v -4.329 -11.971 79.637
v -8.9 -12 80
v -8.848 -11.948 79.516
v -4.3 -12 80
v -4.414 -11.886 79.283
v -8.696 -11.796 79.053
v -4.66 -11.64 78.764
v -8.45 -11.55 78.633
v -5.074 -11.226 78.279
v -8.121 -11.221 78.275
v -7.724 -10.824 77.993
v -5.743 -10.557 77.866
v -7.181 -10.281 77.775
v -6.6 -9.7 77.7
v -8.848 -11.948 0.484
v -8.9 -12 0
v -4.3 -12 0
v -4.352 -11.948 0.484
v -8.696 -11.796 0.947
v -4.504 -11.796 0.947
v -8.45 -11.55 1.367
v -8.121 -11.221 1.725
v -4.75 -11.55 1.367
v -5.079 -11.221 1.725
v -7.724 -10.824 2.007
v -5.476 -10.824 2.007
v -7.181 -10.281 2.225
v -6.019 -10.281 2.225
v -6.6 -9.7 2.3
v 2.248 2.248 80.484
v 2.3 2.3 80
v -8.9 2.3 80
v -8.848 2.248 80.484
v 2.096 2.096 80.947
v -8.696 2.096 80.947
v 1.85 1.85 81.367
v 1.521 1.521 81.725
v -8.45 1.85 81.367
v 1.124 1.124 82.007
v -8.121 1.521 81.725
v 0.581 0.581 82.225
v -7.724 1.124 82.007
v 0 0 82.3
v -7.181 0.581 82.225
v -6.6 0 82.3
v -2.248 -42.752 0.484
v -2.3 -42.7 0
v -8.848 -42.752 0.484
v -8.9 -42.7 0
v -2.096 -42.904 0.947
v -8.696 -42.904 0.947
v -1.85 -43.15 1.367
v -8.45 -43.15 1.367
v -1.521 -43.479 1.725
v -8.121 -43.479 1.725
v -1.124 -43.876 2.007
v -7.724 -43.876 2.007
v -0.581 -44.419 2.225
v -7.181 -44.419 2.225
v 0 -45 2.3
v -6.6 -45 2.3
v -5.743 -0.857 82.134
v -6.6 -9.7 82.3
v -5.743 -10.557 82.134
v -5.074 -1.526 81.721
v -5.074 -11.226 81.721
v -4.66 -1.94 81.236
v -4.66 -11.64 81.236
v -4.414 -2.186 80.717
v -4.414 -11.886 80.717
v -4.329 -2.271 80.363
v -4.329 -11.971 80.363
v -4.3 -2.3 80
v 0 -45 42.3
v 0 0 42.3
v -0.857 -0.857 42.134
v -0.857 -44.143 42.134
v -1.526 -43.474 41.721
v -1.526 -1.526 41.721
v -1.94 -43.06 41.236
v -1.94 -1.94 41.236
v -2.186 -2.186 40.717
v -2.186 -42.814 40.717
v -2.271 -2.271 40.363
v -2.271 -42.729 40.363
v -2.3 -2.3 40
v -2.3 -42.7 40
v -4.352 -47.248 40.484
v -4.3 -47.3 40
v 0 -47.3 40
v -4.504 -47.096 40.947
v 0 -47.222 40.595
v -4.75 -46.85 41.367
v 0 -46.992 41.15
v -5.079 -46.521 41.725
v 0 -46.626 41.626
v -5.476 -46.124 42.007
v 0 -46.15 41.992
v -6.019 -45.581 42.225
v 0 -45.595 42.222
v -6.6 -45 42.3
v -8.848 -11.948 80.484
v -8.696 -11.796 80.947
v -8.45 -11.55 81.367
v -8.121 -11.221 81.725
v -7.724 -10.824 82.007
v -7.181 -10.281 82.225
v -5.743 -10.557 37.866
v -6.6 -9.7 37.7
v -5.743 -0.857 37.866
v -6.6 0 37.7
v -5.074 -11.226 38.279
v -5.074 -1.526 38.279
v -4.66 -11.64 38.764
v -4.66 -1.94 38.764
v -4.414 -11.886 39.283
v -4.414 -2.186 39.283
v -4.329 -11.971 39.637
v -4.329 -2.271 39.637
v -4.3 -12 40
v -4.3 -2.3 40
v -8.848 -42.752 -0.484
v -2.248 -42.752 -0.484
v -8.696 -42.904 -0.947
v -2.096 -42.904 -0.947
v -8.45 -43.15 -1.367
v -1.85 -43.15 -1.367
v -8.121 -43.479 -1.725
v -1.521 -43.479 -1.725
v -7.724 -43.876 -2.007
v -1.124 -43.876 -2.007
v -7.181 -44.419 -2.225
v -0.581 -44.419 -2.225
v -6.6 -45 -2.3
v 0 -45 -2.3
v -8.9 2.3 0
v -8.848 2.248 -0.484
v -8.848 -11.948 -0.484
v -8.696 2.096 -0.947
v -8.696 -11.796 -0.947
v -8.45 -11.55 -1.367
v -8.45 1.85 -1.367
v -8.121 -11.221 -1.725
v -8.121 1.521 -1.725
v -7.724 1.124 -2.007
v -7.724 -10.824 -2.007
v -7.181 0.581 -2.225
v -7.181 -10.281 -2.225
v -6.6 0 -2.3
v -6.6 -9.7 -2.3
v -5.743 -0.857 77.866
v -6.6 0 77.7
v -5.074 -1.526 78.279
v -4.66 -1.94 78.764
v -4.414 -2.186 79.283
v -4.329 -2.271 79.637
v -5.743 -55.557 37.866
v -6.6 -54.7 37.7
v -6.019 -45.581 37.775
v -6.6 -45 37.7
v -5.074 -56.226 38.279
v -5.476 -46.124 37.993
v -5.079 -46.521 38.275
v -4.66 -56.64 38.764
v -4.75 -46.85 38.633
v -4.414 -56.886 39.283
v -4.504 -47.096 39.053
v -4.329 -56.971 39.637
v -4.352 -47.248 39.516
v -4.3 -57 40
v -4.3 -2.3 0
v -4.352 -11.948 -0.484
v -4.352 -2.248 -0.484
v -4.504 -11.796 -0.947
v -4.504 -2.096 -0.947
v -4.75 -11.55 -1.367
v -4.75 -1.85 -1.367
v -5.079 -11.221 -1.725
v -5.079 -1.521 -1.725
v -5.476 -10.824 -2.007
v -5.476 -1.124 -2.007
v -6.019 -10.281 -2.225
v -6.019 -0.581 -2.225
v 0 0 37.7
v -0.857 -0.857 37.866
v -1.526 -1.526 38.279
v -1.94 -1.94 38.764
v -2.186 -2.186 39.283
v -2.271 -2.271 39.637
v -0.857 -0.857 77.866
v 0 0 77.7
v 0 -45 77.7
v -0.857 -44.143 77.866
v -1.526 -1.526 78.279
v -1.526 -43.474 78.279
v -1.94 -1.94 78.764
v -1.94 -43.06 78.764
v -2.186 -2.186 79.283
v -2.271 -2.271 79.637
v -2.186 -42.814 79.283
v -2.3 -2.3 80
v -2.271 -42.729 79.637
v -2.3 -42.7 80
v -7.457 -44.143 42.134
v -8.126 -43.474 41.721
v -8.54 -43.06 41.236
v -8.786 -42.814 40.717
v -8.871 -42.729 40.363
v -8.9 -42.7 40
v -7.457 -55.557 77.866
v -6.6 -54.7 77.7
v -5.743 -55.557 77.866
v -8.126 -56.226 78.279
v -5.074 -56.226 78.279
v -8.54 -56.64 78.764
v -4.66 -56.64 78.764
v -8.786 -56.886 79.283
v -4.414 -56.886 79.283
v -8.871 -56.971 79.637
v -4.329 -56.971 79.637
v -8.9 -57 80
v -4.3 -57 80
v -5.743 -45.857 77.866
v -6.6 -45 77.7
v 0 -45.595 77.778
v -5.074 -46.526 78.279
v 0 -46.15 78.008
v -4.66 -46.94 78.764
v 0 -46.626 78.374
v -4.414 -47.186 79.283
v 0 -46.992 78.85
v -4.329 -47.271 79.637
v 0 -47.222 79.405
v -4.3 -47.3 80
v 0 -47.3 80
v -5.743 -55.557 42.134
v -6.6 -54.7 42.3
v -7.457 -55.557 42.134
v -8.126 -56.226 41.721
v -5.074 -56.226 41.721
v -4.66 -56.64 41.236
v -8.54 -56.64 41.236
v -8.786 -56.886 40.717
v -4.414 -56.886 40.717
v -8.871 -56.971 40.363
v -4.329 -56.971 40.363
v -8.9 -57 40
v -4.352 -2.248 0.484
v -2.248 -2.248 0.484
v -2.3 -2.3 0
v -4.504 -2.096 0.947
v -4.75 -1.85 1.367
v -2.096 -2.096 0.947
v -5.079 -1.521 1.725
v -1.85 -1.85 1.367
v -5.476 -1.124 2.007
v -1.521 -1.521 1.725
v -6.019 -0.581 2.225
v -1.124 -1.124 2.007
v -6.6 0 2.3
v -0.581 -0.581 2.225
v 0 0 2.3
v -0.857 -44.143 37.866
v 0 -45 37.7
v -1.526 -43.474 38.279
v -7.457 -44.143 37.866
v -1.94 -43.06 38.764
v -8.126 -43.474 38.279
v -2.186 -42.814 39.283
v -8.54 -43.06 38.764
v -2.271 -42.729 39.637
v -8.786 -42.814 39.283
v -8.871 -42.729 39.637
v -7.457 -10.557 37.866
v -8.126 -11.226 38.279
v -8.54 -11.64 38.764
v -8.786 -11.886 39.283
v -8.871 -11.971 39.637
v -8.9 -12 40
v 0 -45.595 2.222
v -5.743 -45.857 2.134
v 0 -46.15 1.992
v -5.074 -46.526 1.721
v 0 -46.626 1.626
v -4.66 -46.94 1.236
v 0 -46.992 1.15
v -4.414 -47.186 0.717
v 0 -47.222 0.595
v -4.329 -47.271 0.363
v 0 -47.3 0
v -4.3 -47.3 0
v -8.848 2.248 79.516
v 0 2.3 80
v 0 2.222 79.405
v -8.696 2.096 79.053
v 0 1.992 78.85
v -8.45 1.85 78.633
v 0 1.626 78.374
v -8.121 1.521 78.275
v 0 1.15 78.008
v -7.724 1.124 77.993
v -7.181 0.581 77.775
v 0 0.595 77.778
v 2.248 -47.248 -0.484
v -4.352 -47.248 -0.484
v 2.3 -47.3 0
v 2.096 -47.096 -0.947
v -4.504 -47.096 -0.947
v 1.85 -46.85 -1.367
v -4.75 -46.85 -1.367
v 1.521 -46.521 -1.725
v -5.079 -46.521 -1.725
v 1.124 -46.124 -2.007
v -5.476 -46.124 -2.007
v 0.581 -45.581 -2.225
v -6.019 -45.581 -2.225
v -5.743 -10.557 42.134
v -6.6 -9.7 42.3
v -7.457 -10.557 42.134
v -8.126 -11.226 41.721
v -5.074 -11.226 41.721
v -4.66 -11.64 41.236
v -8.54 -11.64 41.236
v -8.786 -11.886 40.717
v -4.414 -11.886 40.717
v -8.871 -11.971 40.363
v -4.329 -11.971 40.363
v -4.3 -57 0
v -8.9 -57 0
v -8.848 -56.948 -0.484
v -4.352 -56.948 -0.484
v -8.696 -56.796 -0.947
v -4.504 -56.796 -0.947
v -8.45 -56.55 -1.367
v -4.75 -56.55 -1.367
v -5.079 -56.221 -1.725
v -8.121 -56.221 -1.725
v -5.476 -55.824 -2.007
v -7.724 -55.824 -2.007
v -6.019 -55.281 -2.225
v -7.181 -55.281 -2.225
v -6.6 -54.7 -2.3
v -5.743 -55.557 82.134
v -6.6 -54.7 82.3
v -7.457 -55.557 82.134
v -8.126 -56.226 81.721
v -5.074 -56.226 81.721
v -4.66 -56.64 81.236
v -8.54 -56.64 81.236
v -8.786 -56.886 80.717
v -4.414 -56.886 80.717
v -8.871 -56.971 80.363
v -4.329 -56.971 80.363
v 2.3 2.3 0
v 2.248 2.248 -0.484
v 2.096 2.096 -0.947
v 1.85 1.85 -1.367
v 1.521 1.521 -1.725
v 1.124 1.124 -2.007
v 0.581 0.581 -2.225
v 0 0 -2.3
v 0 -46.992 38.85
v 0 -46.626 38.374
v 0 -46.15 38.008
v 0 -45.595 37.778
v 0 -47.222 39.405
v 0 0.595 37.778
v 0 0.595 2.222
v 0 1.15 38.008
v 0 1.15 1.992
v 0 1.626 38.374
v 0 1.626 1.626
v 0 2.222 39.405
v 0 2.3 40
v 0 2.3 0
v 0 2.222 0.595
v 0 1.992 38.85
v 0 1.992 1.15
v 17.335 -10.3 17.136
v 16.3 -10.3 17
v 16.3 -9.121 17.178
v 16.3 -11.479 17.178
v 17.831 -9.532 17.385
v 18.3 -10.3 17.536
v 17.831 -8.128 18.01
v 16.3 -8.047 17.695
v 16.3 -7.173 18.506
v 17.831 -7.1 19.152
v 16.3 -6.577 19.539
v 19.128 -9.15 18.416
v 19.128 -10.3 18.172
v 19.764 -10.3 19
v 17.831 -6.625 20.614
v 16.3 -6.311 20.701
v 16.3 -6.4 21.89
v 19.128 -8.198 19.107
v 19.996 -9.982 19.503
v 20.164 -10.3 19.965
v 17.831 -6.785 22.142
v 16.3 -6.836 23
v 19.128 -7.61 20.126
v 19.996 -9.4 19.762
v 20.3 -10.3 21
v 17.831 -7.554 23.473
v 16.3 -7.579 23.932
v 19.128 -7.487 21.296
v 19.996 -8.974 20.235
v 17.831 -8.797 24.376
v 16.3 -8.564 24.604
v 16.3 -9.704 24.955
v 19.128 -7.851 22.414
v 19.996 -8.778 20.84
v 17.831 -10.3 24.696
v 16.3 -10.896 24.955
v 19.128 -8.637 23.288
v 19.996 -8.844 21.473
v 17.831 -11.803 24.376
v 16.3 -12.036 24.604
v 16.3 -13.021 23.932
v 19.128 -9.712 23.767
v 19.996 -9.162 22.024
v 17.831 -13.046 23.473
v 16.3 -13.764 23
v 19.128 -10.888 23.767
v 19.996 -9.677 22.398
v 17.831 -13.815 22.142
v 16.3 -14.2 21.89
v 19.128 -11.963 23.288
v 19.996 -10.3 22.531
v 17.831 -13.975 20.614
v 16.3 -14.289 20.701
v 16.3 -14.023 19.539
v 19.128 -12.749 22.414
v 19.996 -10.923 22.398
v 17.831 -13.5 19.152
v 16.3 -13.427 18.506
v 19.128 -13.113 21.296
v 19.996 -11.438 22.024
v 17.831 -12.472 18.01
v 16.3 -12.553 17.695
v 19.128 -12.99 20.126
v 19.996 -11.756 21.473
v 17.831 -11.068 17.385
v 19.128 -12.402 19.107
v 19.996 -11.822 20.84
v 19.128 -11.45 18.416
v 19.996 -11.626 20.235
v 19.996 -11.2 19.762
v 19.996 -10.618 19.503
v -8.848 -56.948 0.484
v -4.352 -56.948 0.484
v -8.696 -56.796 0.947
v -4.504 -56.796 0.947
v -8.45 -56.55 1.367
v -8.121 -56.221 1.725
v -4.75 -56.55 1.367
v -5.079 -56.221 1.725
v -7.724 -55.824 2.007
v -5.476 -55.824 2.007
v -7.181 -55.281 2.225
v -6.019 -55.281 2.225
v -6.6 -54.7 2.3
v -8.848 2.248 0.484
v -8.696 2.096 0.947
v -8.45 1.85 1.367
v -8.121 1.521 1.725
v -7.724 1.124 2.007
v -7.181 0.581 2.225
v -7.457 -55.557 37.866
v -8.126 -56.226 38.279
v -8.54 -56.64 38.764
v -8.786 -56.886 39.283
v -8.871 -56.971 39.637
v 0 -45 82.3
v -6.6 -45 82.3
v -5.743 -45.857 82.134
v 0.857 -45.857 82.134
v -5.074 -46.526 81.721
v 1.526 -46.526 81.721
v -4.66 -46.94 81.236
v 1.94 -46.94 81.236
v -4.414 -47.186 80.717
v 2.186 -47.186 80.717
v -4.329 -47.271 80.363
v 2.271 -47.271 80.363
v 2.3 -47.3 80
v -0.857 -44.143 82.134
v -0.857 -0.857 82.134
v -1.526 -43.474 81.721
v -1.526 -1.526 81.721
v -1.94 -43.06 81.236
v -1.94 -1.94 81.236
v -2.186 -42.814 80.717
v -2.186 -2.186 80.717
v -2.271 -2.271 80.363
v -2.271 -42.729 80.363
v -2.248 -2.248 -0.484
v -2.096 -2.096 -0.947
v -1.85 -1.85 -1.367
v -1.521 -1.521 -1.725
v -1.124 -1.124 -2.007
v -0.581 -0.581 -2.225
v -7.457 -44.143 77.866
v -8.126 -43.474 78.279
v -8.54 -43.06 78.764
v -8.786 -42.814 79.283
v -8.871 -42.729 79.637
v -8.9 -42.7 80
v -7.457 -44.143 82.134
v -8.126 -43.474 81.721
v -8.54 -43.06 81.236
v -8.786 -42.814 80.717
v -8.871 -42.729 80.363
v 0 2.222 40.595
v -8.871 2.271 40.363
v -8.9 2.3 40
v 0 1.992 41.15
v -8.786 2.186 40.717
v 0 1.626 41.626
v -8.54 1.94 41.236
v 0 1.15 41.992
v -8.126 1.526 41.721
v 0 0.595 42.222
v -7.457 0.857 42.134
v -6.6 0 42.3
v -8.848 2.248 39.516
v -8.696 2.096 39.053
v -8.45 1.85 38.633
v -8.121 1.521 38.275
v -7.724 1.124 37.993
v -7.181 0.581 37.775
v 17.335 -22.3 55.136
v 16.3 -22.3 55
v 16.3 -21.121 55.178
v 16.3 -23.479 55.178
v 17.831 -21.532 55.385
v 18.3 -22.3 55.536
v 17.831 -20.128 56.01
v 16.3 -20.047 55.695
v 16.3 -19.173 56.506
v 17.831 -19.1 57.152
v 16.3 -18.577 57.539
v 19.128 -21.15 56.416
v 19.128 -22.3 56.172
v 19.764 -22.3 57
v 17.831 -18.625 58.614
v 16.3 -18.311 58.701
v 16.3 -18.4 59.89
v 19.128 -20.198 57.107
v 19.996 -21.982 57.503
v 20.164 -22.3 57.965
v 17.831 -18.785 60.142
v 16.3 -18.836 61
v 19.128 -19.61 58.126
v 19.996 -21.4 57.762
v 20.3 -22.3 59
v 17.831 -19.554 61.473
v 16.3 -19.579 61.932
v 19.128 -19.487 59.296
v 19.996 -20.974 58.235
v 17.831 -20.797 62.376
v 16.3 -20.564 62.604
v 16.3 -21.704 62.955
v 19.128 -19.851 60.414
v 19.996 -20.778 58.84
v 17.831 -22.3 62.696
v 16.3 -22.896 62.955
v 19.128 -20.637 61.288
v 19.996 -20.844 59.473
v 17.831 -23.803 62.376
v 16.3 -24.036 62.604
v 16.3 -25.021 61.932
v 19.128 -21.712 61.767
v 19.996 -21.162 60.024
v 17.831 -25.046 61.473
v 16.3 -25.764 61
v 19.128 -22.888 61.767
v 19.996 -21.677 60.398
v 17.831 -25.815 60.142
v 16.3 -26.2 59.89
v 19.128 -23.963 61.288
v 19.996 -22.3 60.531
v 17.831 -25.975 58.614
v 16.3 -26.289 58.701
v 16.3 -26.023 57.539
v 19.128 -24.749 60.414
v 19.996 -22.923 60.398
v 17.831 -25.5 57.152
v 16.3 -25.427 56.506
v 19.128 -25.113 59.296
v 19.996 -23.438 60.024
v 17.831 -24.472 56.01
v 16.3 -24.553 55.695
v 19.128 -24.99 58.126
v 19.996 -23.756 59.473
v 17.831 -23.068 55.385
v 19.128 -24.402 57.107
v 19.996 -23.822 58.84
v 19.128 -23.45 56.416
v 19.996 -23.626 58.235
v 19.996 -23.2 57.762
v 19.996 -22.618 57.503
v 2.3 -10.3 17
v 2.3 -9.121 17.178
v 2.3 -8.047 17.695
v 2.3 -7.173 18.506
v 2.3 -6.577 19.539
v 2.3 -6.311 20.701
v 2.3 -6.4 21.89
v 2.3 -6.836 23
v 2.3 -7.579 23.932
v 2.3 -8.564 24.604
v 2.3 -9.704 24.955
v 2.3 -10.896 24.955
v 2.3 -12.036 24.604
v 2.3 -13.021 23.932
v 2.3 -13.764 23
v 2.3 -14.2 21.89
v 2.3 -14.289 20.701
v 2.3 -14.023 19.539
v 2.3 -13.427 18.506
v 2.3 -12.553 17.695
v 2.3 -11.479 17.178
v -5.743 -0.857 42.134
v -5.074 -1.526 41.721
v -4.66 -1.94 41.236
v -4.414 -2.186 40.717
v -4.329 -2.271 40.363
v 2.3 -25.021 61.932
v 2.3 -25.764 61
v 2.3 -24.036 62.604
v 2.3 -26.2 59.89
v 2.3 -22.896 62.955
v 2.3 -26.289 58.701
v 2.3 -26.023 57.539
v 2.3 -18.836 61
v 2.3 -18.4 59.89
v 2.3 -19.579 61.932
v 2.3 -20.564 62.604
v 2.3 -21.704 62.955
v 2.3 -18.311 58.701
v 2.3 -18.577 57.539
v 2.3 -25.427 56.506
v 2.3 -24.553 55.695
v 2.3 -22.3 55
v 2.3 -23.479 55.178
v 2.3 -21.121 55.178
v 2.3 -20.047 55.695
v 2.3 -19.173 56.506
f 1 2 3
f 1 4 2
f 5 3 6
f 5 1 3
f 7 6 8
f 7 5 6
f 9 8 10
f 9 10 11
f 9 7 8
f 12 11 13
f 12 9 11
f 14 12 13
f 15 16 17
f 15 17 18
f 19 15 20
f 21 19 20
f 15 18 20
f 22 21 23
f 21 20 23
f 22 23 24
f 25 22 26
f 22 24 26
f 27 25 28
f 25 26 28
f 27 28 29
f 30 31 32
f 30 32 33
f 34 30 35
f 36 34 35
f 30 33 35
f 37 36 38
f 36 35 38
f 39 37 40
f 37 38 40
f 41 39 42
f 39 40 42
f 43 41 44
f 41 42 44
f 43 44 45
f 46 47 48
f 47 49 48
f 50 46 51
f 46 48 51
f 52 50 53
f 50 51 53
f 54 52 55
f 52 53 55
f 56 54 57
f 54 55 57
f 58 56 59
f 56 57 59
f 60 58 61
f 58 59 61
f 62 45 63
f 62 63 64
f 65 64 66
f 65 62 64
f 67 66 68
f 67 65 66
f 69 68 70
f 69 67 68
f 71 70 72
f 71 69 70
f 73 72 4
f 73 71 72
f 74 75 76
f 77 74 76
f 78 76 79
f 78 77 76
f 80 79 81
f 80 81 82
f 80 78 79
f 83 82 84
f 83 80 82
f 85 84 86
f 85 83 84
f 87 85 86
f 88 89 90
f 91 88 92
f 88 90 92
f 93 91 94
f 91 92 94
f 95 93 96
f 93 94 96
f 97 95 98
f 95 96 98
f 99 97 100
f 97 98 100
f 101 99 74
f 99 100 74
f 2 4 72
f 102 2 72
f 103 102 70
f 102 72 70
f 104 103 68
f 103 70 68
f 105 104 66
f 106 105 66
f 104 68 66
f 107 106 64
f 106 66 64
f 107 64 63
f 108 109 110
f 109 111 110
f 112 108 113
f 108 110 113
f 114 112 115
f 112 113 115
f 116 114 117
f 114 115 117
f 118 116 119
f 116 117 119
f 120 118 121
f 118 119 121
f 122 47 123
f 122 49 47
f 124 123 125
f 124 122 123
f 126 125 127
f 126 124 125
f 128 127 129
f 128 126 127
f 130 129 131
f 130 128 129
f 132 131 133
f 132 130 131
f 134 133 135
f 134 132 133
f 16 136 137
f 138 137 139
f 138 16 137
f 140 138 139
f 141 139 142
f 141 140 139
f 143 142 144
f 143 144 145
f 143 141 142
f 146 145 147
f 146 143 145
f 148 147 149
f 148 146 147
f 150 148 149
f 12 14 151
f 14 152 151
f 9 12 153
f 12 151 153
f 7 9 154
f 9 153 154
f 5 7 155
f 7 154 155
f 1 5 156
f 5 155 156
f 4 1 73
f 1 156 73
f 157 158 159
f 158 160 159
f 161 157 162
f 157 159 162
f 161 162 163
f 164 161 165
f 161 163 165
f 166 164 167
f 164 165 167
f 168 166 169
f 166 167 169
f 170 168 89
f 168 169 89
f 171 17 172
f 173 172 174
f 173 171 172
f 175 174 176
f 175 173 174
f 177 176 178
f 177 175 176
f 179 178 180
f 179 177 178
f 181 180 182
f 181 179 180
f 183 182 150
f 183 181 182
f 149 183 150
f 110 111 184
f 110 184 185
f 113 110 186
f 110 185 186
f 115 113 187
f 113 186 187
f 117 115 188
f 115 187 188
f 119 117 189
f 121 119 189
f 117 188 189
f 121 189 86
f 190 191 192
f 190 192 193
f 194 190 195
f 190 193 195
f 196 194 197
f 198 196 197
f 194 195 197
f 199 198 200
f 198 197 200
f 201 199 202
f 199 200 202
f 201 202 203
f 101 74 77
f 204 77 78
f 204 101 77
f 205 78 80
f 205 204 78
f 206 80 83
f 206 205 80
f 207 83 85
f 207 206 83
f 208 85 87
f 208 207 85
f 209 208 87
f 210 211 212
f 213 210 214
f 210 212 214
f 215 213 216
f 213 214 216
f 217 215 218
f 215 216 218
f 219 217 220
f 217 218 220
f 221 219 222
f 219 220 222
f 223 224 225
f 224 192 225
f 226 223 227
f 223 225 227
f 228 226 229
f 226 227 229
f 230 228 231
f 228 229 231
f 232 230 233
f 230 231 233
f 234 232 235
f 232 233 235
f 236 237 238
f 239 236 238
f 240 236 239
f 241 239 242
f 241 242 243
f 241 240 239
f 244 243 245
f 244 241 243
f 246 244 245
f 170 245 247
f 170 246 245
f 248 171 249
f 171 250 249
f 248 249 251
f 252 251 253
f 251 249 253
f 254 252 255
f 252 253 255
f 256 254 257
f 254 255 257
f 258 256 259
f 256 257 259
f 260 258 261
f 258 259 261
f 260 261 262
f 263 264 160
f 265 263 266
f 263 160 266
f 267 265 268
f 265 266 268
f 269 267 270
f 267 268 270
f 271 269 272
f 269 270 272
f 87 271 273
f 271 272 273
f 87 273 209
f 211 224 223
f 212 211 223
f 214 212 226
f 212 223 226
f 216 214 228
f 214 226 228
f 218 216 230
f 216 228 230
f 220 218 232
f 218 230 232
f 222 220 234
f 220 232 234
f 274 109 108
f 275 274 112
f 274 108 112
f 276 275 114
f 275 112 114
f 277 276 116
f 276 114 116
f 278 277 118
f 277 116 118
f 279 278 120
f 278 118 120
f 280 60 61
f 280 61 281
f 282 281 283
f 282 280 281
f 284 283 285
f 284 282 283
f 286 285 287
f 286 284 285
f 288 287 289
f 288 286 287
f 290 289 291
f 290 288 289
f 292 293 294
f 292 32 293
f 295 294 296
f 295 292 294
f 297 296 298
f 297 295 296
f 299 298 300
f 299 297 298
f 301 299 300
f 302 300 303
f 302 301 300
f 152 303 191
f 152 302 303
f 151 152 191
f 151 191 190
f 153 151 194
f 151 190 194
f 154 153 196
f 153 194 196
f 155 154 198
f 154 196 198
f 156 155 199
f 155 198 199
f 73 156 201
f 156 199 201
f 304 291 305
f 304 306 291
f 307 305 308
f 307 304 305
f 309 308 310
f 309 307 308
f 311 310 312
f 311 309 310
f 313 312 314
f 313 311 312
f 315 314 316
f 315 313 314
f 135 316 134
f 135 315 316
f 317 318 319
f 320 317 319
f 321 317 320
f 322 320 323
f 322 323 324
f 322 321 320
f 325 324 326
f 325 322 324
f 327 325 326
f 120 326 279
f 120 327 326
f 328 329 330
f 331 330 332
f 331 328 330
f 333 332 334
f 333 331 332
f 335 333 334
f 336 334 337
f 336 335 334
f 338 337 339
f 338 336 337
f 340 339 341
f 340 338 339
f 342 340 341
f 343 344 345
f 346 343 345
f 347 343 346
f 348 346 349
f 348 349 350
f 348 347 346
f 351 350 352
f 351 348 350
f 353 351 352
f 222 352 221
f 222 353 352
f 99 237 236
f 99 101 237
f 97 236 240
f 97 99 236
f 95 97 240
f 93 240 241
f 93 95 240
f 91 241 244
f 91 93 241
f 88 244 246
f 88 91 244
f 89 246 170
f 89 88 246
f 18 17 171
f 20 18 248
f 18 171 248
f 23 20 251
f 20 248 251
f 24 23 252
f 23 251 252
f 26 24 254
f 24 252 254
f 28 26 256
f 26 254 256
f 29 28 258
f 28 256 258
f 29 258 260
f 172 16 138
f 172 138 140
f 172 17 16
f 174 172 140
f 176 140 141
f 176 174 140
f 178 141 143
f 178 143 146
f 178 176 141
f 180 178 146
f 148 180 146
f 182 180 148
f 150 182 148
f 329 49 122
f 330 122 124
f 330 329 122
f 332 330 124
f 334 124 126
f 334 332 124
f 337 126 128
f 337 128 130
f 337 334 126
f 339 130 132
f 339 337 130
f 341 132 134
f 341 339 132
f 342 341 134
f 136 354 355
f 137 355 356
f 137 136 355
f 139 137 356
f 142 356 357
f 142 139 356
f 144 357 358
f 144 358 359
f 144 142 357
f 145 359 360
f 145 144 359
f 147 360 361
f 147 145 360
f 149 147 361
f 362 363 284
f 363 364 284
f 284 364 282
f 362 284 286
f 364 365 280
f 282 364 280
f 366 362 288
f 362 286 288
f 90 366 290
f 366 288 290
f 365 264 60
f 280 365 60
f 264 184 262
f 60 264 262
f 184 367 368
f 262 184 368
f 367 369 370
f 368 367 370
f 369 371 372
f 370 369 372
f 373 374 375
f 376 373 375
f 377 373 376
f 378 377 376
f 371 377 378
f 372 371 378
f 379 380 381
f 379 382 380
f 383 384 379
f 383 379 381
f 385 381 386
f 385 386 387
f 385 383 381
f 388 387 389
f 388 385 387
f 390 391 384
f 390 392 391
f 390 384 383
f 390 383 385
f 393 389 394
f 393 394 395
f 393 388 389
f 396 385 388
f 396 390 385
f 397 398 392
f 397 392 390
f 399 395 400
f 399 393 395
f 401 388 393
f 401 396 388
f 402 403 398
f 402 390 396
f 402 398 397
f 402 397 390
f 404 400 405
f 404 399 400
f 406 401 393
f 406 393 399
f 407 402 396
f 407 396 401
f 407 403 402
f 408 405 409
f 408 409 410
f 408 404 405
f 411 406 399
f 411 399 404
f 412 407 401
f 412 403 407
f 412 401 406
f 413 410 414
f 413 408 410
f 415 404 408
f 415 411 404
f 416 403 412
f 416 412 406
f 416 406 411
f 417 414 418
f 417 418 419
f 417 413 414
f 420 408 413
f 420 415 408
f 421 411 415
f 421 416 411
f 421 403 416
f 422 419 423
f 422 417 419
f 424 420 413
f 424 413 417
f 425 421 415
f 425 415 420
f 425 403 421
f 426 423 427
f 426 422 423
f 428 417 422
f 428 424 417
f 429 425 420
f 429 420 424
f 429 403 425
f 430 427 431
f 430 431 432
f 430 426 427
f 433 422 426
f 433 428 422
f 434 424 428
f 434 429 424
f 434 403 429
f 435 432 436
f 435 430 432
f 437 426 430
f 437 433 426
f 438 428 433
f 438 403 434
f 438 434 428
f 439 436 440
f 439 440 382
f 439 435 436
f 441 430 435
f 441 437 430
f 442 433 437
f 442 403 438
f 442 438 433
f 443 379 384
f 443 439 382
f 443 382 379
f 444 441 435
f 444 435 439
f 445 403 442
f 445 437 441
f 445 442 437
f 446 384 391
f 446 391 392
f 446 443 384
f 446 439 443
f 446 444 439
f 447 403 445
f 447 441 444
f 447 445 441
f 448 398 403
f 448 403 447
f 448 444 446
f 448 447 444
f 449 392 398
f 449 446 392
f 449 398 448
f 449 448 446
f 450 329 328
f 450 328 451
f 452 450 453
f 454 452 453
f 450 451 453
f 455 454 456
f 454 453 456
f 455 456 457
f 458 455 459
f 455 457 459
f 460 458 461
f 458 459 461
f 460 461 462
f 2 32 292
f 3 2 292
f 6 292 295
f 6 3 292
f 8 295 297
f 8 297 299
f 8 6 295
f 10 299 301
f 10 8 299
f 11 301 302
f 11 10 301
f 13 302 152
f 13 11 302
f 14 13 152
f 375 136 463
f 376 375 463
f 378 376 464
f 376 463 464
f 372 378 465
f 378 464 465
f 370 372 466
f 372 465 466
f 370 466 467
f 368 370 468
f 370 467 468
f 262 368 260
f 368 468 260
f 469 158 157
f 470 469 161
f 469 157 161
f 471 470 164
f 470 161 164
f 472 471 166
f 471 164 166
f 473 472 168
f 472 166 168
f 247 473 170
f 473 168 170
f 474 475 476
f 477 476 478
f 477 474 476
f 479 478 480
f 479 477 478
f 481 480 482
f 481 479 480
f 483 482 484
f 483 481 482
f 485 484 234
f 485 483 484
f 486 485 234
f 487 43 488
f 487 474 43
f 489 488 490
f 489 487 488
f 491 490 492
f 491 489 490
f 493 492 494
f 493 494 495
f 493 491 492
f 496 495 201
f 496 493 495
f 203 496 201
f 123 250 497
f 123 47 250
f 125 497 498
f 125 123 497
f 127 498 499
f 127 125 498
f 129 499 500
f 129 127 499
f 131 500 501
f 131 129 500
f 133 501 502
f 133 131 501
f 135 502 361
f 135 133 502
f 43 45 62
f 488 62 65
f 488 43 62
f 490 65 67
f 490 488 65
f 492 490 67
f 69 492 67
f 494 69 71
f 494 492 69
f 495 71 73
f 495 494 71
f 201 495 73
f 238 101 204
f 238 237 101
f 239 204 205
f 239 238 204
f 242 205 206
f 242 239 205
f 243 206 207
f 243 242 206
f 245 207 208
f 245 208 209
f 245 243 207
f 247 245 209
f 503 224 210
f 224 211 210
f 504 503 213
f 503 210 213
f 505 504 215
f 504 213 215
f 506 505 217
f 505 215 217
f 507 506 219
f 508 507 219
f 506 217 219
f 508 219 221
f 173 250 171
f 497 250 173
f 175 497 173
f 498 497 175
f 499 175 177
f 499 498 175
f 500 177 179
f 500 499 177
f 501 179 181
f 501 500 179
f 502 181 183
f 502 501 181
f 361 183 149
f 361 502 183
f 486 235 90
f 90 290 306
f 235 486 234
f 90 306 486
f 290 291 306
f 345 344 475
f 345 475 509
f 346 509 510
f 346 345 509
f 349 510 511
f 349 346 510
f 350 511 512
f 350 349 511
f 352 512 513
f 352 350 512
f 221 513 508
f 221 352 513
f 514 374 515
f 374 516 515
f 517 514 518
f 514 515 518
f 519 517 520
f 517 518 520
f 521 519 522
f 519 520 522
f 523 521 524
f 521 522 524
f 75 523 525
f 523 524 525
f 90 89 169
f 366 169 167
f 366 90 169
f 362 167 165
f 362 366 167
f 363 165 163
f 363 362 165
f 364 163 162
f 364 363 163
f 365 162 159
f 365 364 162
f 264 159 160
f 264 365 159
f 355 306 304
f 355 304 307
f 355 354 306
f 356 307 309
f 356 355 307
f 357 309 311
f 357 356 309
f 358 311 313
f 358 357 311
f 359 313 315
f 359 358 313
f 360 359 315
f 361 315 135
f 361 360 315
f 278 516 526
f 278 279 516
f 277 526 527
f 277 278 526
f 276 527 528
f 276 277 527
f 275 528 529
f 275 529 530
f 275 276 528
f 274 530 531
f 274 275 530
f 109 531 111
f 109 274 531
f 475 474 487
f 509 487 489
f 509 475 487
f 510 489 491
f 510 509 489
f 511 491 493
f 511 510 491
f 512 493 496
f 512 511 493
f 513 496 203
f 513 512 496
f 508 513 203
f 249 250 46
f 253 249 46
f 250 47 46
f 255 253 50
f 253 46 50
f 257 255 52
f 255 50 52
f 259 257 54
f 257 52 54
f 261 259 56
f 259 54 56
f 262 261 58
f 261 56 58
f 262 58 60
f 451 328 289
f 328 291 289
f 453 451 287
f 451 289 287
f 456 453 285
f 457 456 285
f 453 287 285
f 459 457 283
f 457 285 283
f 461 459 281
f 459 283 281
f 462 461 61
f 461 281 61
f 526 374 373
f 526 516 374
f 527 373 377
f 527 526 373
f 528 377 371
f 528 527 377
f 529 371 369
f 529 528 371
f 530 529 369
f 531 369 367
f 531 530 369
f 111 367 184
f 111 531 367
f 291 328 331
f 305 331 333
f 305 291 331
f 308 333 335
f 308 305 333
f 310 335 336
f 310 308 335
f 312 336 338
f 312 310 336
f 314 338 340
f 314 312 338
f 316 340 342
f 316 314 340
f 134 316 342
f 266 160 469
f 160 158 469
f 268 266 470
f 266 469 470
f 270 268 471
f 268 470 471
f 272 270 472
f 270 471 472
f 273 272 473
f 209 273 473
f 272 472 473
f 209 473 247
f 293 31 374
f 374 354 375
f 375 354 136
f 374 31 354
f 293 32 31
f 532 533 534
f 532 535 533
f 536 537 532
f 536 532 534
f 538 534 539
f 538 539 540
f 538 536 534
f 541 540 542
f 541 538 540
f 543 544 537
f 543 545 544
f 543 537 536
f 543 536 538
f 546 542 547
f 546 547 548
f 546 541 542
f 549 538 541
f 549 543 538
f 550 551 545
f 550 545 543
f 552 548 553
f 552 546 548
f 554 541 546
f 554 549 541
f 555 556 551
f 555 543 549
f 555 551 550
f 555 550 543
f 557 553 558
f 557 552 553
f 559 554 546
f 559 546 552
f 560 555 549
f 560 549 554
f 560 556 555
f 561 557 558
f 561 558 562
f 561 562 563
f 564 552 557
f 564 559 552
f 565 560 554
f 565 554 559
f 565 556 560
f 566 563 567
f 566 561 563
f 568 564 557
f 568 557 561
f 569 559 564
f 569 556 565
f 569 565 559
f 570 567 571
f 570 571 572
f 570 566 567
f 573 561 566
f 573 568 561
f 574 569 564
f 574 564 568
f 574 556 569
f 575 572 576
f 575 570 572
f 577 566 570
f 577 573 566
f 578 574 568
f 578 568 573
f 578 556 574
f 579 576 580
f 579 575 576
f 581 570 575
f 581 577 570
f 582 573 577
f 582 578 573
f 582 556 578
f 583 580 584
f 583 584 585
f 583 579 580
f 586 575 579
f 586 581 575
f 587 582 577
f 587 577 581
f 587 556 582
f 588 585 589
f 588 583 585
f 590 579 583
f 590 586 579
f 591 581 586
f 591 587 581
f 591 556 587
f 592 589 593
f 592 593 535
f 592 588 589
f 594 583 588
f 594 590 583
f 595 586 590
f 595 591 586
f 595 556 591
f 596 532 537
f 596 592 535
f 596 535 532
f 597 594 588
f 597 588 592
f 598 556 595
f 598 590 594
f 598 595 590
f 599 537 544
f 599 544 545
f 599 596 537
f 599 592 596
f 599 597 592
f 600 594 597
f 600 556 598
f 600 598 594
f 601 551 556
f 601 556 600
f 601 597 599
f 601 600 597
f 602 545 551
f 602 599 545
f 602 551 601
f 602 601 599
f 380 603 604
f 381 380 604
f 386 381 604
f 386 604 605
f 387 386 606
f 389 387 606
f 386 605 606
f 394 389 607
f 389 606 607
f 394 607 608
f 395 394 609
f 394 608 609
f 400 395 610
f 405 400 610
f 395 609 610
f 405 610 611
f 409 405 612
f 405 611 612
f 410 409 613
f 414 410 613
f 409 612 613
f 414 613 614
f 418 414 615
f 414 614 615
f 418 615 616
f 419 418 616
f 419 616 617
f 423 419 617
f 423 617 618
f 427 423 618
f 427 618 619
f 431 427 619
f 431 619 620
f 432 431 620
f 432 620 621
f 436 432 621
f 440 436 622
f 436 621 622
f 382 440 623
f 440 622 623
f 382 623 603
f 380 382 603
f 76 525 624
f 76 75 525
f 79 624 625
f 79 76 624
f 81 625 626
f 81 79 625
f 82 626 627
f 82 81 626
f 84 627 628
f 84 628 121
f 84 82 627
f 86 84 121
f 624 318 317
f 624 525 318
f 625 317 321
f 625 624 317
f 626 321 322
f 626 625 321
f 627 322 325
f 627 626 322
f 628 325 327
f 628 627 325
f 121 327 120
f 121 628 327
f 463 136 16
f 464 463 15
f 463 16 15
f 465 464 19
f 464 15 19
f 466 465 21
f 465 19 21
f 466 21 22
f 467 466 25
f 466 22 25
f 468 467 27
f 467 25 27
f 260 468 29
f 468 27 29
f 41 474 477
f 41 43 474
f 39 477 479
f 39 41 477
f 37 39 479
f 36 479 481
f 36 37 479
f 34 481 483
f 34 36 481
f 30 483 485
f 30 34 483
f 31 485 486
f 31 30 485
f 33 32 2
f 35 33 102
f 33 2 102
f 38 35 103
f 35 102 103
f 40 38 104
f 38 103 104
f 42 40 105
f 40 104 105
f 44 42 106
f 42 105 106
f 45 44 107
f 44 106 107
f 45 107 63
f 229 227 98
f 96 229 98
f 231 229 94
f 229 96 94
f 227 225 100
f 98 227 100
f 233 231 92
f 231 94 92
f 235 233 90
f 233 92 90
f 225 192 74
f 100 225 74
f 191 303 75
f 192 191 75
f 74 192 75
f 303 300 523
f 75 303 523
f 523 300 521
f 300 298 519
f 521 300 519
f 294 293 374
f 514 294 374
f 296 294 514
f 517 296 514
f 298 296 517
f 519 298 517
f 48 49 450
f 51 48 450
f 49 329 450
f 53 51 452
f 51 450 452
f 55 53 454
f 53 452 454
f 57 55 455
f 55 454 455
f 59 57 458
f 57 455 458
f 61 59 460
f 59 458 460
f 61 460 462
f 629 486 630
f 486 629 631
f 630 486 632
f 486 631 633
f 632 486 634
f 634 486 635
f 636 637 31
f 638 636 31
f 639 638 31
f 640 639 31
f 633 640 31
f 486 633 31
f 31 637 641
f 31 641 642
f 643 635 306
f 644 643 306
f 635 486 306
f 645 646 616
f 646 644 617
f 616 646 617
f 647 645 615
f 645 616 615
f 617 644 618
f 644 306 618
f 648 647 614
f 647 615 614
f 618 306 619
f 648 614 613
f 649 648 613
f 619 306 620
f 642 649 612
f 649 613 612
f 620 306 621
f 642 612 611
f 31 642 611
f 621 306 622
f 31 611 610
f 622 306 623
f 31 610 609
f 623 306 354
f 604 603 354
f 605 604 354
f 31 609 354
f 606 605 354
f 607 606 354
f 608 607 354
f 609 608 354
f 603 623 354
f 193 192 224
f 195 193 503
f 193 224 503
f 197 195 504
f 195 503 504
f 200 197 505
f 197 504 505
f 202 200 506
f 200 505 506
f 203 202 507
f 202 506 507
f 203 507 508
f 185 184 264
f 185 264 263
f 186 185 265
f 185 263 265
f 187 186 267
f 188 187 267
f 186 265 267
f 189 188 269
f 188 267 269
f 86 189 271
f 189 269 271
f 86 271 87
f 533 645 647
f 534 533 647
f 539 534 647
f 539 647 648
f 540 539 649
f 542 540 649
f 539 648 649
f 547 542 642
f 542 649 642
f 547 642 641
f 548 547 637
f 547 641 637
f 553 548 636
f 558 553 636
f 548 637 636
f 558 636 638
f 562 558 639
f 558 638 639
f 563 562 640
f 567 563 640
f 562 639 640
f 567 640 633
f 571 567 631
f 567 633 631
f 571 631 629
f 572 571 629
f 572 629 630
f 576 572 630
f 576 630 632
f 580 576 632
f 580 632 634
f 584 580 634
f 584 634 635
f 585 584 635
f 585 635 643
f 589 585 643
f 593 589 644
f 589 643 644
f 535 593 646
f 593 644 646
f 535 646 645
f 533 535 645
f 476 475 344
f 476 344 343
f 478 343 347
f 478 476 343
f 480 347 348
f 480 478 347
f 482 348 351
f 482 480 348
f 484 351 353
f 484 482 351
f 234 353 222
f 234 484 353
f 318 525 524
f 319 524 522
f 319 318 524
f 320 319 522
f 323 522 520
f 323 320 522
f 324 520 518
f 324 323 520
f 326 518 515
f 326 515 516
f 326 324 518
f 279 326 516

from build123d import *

# Parameters (mm, degrees)
EXTRU_MINCE1_DEPTH           = 2.3
CONG_1_R                     = 2.3
ESQUISSE2_W                  = 80
ESQUISSE2_H                  = 49.6
BOSS_EXTRU_1_DEPTH           = 2.3
R_P_TITION_START             = 77.7
R_P_TITION_LIN_AIRE1_DEPTH   = 4.6
R_P_TITION_START_2           = 37.7
R_P_TITION_LIN_AIRE1_2_DEPTH = 4.6
CONG_2_R                     = 2.3
ESQUISSE3_R                  = 4
BOSS_EXTRU_2_DEPTH           = 18
CONG_3_R                     = 4


# Read off the part's stored shape, not the designer's step: Répétition linéaire1
with BuildPart() as part:
    # Esquisse1 → Extru.-Mince1 (new, symmetric)
    with BuildSketch(Plane.XY):
        Polygon((-4.3, -57), (-4.3, -47.3), (2.3, -47.3), (2.3, 2.3), (-8.9, 2.3), (-8.9, -12), (-4.3, -12), (-4.3, -2.3), (-2.3, -2.3), (-2.3, -42.7), (-8.9, -42.7), (-8.9, -57), align=None)
    extrude(amount=EXTRU_MINCE1_DEPTH, both=True)

    # Congé1
    cong_1_edges = [part.edges().sort_by_distance(p)[0] for p in [
        (-6.6, -57, -2.3),
        (-4.3, -52.15, -2.3),
        (-1, -47.3, -2.3),
        (2.3, -22.5, -2.3),
        (-3.3, 2.3, -2.3),
        (-8.9, -4.85, -2.3),
        (-6.6, -12, -2.3),
        (-4.3, -7.15, -2.3),
        (-3.3, -2.3, -2.3),
        (-2.3, -22.5, -2.3),
        (-5.6, -42.7, -2.3),
        (-8.9, -49.85, -2.3),
        (-5.6, -42.7, 2.3),
        (-2.3, -22.5, 2.3),
        (-3.3, -2.3, 2.3),
        (-4.3, -7.15, 2.3),
        (-6.6, -12, 2.3),
        (-8.9, -4.85, 2.3),
        (-3.3, 2.3, 2.3),
        (2.3, -22.5, 2.3),
        (-1, -47.3, 2.3),
        (-4.3, -52.15, 2.3),
        (-6.6, -57, 2.3),
        (-8.9, -49.85, 2.3),
    ]]
    fillet(cong_1_edges, radius=CONG_1_R - 0.0001)  # a hair under: the kernel refuses the full size

    # Esquisse2 → Boss.-Extru.1 (add)
    with BuildSketch(Plane(origin=(0, 0, 0), x_dir=(0, 0, -1), z_dir=(1, 0, 0))):
        with Locations((-40, -22.5)):
            Rectangle(ESQUISSE2_W, ESQUISSE2_H)
    extrude(amount=BOSS_EXTRU_1_DEPTH)

    # Répétition linéaire1 outline → Répétition linéaire1 (add)
    with BuildSketch(Plane.XY.offset(R_P_TITION_START)):
        Polygon((-8.9, 2.3), (-8.9, -12), (-4.3, -12), (-4.3, -2.3), (-2.3, -2.3), (-2.3, -42.7), (-8.9, -42.7), (-8.9, -57), (-4.3, -57), (-4.3, -47.3), (2.3, -47.3), (2.3, 2.3), align=None)
    extrude(amount=R_P_TITION_LIN_AIRE1_DEPTH)

    # R_p_tition lin_aire1 2 outline → R_p_tition lin_aire1 2 (add)
    with BuildSketch(Plane.XY.offset(R_P_TITION_START_2)):
        Polygon((0, 2.3), (-8.9, 2.3), (-8.9, -12), (-4.3, -12), (-4.3, -2.3), (-2.3, -2.3), (-2.3, -42.7), (-8.9, -42.7), (-8.9, -57), (-4.3, -57), (-4.3, -47.3), (0, -47.3), align=None)
    extrude(amount=R_P_TITION_LIN_AIRE1_2_DEPTH)

    # Congé2
    cong_2_edges = [part.edges().sort_by_distance(p)[0] for p in [
        (-5.6, -42.7, 42.3),
        (-2.3, -22.5, 42.3),
        (-3.3, -2.3, 42.3),
        (-4.3, -7.15, 42.3),
        (-6.6, -12, 42.3),
        (-8.9, -4.85, 42.3),
        (-4.45, 2.3, 42.3),
        (-2.15, -47.3, 42.3),
        (-4.3, -52.15, 42.3),
        (-6.6, -57, 42.3),
        (-8.9, -49.85, 42.3),
        (-2.15, -47.3, 37.7),
        (-4.3, -52.15, 37.7),
        (-6.6, -57, 37.7),
        (-8.9, -49.85, 37.7),
        (-5.6, -42.7, 37.7),
        (-2.3, -22.5, 37.7),
        (-3.3, -2.3, 37.7),
        (-4.3, -7.15, 37.7),
        (-6.6, -12, 37.7),
        (-8.9, -4.85, 37.7),
        (-4.45, 2.3, 37.7),
        (-5.6, -42.7, 82.3),
        (-2.3, -22.5, 82.3),
        (-3.3, -2.3, 82.3),
        (-4.3, -7.15, 82.3),
        (-6.6, -12, 82.3),
        (-8.9, -4.85, 82.3),
        (-3.3, 2.3, 82.3),
        (2.3, -22.5, 82.3),
        (-1, -47.3, 82.3),
        (-4.3, -52.15, 82.3),
        (-6.6, -57, 82.3),
        (-8.9, -49.85, 82.3),
        (-2.15, -47.3, 77.7),
        (-4.3, -52.15, 77.7),
        (-6.6, -57, 77.7),
        (-8.9, -49.85, 77.7),
        (-5.6, -42.7, 77.7),
        (-2.3, -22.5, 77.7),
        (-3.3, -2.3, 77.7),
        (-4.3, -7.15, 77.7),
        (-6.6, -12, 77.7),
        (-8.9, -4.85, 77.7),
        (-4.45, 2.3, 77.7),
    ]]
    fillet(cong_2_edges, radius=CONG_2_R - 0.0001)  # a hair under: the kernel refuses the full size

    # Esquisse3 → Boss.-Extru.2 (add)
    with BuildSketch(Plane(origin=(2.3, 0, 0), x_dir=(0, 0, -1), z_dir=(1, 0, 0))):
        with Locations((-59, -22.3)):
            Circle(ESQUISSE3_R)
        with Locations((-21, -10.3)):
            Circle(ESQUISSE3_R)
    extrude(amount=BOSS_EXTRU_2_DEPTH)

    # Congé3
    cong_3_edges = [part.edges().sort_by_distance(p)[0] for p in [
        (20.3, -22.3, 63),
        (20.3, -10.3, 25),
    ]]
    fillet(cong_3_edges, radius=CONG_3_R)


solid = part.part
